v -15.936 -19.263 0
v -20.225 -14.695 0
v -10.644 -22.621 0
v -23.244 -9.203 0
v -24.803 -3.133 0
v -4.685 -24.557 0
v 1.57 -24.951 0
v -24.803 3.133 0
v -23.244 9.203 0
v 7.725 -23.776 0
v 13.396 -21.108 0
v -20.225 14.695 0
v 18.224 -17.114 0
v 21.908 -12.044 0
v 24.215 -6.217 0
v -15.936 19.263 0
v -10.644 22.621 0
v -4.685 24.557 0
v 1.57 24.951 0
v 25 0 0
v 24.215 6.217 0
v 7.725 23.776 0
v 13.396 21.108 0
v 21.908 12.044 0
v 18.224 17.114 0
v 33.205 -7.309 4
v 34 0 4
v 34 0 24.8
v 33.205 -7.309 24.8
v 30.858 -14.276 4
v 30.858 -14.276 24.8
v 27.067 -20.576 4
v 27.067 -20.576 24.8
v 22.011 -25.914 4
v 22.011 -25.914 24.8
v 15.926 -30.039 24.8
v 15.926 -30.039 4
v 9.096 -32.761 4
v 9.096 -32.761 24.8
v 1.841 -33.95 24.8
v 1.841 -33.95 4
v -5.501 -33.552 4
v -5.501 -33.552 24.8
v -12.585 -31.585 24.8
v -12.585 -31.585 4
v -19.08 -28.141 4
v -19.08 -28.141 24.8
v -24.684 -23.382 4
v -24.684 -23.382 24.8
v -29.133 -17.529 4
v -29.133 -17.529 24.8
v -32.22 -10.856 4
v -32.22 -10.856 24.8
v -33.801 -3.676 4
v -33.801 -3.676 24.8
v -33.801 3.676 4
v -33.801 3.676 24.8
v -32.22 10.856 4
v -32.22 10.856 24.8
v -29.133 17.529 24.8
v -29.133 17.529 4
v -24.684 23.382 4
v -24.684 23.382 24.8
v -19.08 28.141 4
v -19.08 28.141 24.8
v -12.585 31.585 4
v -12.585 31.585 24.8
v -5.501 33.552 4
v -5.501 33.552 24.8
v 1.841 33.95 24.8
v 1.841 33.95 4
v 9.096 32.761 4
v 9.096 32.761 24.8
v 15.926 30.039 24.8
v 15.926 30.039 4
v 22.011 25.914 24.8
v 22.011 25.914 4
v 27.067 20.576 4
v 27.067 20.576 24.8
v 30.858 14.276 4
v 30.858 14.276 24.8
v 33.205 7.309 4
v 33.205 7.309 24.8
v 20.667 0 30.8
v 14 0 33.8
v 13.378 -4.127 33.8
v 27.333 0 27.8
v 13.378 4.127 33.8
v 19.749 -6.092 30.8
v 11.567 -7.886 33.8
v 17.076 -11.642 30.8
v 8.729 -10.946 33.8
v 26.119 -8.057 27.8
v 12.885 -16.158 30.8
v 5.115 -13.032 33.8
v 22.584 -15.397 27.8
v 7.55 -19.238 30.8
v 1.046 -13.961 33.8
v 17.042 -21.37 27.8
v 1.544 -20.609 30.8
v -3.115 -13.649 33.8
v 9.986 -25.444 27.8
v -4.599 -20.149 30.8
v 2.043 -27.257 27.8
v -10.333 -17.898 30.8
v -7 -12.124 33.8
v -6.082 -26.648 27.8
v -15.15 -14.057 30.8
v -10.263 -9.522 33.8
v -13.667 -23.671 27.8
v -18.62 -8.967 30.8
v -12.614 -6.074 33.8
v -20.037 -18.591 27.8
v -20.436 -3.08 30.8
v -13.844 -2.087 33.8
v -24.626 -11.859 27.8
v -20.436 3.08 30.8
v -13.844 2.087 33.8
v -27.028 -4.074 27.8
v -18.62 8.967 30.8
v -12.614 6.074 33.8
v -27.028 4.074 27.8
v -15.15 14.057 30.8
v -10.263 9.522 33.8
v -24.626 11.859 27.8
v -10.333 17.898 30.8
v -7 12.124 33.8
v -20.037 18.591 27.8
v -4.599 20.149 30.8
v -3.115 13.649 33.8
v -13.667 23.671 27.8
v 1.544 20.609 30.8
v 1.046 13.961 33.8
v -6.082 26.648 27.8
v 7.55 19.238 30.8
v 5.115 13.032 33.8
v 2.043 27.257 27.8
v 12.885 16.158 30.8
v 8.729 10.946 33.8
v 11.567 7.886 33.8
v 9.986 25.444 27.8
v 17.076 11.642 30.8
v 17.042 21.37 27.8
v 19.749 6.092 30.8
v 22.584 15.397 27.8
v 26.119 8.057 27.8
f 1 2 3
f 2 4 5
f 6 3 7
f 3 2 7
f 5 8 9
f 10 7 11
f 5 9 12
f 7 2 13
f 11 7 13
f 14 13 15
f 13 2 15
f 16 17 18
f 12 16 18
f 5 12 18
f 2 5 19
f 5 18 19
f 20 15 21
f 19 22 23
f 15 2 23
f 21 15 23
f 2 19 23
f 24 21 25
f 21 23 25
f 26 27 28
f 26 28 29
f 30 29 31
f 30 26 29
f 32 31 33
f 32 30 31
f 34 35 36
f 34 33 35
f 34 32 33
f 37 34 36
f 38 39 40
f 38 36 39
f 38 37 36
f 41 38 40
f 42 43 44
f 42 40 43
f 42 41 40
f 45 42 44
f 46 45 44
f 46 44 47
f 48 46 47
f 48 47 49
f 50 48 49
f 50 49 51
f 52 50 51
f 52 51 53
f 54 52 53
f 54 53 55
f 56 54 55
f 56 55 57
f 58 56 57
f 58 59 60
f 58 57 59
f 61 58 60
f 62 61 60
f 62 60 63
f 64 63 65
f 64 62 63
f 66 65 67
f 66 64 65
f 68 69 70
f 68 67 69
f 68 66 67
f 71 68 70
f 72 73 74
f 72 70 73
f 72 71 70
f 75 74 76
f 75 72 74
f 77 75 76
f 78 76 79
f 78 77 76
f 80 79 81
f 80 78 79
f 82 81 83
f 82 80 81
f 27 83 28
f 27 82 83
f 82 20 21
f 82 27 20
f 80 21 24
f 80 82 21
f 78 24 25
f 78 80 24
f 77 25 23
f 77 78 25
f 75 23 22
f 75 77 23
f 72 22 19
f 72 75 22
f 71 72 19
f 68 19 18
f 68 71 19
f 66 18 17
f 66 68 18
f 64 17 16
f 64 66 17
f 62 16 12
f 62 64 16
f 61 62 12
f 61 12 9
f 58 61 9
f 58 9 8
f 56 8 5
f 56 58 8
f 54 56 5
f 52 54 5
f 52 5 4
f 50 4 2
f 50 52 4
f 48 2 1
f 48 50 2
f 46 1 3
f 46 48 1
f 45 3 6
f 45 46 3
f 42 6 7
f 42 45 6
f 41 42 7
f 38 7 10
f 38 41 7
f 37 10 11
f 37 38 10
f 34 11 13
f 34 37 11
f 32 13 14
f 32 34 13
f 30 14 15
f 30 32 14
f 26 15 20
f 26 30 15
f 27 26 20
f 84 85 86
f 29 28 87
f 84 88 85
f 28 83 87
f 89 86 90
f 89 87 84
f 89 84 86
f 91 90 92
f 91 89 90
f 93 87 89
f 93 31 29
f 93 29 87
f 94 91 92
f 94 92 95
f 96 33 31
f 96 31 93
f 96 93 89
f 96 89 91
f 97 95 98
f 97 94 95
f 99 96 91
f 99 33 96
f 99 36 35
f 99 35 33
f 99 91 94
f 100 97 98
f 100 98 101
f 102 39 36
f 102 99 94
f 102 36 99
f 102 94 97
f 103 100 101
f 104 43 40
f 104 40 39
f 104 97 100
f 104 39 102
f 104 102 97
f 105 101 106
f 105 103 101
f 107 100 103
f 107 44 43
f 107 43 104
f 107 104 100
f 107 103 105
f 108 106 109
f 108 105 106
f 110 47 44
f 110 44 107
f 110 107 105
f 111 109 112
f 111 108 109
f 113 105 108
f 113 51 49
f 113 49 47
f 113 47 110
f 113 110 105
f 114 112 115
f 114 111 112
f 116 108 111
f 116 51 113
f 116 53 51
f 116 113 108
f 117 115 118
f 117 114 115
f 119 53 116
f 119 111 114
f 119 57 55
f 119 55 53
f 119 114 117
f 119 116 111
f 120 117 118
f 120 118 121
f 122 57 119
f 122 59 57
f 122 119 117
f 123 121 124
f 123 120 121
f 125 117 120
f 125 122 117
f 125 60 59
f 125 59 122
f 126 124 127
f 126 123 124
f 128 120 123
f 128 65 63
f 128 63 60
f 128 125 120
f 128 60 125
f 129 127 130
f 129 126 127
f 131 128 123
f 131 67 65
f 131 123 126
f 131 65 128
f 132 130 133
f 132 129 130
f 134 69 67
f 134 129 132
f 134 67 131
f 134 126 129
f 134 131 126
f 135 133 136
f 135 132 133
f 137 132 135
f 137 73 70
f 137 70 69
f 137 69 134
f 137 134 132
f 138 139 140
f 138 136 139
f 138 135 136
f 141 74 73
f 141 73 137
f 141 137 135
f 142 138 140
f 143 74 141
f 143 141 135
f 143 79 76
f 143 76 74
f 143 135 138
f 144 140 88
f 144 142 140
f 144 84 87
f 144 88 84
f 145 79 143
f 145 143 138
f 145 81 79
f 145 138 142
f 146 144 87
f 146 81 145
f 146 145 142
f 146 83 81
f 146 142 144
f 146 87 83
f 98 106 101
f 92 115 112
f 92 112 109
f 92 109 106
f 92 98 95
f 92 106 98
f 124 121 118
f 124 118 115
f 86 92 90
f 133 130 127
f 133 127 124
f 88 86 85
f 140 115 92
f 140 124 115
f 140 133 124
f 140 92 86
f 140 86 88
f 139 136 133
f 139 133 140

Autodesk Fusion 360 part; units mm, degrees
sketch "Sketch1" plane through (0, 0, 0) normal (0, 0, 1) x (1, 0, 0)
  circle A0 centre (0, 0) radius 34
  dimension "MotorDia" = 68
extrude "Extrude1" add sketch "Sketch1" along normal blind 33.8
chamfer "Chamfer1" distance 4 distance2 9 1 edges at (-31.6991, -12.2949, 0) measured on face at (33.9577, -1.6948, 22.5333)
chamfer "Chamfer2" distance 20 distance2 9 1 edges at (-31.6991, -12.2949, 33.8) measured on face at (10.8298, 6.4941, 33.8)
